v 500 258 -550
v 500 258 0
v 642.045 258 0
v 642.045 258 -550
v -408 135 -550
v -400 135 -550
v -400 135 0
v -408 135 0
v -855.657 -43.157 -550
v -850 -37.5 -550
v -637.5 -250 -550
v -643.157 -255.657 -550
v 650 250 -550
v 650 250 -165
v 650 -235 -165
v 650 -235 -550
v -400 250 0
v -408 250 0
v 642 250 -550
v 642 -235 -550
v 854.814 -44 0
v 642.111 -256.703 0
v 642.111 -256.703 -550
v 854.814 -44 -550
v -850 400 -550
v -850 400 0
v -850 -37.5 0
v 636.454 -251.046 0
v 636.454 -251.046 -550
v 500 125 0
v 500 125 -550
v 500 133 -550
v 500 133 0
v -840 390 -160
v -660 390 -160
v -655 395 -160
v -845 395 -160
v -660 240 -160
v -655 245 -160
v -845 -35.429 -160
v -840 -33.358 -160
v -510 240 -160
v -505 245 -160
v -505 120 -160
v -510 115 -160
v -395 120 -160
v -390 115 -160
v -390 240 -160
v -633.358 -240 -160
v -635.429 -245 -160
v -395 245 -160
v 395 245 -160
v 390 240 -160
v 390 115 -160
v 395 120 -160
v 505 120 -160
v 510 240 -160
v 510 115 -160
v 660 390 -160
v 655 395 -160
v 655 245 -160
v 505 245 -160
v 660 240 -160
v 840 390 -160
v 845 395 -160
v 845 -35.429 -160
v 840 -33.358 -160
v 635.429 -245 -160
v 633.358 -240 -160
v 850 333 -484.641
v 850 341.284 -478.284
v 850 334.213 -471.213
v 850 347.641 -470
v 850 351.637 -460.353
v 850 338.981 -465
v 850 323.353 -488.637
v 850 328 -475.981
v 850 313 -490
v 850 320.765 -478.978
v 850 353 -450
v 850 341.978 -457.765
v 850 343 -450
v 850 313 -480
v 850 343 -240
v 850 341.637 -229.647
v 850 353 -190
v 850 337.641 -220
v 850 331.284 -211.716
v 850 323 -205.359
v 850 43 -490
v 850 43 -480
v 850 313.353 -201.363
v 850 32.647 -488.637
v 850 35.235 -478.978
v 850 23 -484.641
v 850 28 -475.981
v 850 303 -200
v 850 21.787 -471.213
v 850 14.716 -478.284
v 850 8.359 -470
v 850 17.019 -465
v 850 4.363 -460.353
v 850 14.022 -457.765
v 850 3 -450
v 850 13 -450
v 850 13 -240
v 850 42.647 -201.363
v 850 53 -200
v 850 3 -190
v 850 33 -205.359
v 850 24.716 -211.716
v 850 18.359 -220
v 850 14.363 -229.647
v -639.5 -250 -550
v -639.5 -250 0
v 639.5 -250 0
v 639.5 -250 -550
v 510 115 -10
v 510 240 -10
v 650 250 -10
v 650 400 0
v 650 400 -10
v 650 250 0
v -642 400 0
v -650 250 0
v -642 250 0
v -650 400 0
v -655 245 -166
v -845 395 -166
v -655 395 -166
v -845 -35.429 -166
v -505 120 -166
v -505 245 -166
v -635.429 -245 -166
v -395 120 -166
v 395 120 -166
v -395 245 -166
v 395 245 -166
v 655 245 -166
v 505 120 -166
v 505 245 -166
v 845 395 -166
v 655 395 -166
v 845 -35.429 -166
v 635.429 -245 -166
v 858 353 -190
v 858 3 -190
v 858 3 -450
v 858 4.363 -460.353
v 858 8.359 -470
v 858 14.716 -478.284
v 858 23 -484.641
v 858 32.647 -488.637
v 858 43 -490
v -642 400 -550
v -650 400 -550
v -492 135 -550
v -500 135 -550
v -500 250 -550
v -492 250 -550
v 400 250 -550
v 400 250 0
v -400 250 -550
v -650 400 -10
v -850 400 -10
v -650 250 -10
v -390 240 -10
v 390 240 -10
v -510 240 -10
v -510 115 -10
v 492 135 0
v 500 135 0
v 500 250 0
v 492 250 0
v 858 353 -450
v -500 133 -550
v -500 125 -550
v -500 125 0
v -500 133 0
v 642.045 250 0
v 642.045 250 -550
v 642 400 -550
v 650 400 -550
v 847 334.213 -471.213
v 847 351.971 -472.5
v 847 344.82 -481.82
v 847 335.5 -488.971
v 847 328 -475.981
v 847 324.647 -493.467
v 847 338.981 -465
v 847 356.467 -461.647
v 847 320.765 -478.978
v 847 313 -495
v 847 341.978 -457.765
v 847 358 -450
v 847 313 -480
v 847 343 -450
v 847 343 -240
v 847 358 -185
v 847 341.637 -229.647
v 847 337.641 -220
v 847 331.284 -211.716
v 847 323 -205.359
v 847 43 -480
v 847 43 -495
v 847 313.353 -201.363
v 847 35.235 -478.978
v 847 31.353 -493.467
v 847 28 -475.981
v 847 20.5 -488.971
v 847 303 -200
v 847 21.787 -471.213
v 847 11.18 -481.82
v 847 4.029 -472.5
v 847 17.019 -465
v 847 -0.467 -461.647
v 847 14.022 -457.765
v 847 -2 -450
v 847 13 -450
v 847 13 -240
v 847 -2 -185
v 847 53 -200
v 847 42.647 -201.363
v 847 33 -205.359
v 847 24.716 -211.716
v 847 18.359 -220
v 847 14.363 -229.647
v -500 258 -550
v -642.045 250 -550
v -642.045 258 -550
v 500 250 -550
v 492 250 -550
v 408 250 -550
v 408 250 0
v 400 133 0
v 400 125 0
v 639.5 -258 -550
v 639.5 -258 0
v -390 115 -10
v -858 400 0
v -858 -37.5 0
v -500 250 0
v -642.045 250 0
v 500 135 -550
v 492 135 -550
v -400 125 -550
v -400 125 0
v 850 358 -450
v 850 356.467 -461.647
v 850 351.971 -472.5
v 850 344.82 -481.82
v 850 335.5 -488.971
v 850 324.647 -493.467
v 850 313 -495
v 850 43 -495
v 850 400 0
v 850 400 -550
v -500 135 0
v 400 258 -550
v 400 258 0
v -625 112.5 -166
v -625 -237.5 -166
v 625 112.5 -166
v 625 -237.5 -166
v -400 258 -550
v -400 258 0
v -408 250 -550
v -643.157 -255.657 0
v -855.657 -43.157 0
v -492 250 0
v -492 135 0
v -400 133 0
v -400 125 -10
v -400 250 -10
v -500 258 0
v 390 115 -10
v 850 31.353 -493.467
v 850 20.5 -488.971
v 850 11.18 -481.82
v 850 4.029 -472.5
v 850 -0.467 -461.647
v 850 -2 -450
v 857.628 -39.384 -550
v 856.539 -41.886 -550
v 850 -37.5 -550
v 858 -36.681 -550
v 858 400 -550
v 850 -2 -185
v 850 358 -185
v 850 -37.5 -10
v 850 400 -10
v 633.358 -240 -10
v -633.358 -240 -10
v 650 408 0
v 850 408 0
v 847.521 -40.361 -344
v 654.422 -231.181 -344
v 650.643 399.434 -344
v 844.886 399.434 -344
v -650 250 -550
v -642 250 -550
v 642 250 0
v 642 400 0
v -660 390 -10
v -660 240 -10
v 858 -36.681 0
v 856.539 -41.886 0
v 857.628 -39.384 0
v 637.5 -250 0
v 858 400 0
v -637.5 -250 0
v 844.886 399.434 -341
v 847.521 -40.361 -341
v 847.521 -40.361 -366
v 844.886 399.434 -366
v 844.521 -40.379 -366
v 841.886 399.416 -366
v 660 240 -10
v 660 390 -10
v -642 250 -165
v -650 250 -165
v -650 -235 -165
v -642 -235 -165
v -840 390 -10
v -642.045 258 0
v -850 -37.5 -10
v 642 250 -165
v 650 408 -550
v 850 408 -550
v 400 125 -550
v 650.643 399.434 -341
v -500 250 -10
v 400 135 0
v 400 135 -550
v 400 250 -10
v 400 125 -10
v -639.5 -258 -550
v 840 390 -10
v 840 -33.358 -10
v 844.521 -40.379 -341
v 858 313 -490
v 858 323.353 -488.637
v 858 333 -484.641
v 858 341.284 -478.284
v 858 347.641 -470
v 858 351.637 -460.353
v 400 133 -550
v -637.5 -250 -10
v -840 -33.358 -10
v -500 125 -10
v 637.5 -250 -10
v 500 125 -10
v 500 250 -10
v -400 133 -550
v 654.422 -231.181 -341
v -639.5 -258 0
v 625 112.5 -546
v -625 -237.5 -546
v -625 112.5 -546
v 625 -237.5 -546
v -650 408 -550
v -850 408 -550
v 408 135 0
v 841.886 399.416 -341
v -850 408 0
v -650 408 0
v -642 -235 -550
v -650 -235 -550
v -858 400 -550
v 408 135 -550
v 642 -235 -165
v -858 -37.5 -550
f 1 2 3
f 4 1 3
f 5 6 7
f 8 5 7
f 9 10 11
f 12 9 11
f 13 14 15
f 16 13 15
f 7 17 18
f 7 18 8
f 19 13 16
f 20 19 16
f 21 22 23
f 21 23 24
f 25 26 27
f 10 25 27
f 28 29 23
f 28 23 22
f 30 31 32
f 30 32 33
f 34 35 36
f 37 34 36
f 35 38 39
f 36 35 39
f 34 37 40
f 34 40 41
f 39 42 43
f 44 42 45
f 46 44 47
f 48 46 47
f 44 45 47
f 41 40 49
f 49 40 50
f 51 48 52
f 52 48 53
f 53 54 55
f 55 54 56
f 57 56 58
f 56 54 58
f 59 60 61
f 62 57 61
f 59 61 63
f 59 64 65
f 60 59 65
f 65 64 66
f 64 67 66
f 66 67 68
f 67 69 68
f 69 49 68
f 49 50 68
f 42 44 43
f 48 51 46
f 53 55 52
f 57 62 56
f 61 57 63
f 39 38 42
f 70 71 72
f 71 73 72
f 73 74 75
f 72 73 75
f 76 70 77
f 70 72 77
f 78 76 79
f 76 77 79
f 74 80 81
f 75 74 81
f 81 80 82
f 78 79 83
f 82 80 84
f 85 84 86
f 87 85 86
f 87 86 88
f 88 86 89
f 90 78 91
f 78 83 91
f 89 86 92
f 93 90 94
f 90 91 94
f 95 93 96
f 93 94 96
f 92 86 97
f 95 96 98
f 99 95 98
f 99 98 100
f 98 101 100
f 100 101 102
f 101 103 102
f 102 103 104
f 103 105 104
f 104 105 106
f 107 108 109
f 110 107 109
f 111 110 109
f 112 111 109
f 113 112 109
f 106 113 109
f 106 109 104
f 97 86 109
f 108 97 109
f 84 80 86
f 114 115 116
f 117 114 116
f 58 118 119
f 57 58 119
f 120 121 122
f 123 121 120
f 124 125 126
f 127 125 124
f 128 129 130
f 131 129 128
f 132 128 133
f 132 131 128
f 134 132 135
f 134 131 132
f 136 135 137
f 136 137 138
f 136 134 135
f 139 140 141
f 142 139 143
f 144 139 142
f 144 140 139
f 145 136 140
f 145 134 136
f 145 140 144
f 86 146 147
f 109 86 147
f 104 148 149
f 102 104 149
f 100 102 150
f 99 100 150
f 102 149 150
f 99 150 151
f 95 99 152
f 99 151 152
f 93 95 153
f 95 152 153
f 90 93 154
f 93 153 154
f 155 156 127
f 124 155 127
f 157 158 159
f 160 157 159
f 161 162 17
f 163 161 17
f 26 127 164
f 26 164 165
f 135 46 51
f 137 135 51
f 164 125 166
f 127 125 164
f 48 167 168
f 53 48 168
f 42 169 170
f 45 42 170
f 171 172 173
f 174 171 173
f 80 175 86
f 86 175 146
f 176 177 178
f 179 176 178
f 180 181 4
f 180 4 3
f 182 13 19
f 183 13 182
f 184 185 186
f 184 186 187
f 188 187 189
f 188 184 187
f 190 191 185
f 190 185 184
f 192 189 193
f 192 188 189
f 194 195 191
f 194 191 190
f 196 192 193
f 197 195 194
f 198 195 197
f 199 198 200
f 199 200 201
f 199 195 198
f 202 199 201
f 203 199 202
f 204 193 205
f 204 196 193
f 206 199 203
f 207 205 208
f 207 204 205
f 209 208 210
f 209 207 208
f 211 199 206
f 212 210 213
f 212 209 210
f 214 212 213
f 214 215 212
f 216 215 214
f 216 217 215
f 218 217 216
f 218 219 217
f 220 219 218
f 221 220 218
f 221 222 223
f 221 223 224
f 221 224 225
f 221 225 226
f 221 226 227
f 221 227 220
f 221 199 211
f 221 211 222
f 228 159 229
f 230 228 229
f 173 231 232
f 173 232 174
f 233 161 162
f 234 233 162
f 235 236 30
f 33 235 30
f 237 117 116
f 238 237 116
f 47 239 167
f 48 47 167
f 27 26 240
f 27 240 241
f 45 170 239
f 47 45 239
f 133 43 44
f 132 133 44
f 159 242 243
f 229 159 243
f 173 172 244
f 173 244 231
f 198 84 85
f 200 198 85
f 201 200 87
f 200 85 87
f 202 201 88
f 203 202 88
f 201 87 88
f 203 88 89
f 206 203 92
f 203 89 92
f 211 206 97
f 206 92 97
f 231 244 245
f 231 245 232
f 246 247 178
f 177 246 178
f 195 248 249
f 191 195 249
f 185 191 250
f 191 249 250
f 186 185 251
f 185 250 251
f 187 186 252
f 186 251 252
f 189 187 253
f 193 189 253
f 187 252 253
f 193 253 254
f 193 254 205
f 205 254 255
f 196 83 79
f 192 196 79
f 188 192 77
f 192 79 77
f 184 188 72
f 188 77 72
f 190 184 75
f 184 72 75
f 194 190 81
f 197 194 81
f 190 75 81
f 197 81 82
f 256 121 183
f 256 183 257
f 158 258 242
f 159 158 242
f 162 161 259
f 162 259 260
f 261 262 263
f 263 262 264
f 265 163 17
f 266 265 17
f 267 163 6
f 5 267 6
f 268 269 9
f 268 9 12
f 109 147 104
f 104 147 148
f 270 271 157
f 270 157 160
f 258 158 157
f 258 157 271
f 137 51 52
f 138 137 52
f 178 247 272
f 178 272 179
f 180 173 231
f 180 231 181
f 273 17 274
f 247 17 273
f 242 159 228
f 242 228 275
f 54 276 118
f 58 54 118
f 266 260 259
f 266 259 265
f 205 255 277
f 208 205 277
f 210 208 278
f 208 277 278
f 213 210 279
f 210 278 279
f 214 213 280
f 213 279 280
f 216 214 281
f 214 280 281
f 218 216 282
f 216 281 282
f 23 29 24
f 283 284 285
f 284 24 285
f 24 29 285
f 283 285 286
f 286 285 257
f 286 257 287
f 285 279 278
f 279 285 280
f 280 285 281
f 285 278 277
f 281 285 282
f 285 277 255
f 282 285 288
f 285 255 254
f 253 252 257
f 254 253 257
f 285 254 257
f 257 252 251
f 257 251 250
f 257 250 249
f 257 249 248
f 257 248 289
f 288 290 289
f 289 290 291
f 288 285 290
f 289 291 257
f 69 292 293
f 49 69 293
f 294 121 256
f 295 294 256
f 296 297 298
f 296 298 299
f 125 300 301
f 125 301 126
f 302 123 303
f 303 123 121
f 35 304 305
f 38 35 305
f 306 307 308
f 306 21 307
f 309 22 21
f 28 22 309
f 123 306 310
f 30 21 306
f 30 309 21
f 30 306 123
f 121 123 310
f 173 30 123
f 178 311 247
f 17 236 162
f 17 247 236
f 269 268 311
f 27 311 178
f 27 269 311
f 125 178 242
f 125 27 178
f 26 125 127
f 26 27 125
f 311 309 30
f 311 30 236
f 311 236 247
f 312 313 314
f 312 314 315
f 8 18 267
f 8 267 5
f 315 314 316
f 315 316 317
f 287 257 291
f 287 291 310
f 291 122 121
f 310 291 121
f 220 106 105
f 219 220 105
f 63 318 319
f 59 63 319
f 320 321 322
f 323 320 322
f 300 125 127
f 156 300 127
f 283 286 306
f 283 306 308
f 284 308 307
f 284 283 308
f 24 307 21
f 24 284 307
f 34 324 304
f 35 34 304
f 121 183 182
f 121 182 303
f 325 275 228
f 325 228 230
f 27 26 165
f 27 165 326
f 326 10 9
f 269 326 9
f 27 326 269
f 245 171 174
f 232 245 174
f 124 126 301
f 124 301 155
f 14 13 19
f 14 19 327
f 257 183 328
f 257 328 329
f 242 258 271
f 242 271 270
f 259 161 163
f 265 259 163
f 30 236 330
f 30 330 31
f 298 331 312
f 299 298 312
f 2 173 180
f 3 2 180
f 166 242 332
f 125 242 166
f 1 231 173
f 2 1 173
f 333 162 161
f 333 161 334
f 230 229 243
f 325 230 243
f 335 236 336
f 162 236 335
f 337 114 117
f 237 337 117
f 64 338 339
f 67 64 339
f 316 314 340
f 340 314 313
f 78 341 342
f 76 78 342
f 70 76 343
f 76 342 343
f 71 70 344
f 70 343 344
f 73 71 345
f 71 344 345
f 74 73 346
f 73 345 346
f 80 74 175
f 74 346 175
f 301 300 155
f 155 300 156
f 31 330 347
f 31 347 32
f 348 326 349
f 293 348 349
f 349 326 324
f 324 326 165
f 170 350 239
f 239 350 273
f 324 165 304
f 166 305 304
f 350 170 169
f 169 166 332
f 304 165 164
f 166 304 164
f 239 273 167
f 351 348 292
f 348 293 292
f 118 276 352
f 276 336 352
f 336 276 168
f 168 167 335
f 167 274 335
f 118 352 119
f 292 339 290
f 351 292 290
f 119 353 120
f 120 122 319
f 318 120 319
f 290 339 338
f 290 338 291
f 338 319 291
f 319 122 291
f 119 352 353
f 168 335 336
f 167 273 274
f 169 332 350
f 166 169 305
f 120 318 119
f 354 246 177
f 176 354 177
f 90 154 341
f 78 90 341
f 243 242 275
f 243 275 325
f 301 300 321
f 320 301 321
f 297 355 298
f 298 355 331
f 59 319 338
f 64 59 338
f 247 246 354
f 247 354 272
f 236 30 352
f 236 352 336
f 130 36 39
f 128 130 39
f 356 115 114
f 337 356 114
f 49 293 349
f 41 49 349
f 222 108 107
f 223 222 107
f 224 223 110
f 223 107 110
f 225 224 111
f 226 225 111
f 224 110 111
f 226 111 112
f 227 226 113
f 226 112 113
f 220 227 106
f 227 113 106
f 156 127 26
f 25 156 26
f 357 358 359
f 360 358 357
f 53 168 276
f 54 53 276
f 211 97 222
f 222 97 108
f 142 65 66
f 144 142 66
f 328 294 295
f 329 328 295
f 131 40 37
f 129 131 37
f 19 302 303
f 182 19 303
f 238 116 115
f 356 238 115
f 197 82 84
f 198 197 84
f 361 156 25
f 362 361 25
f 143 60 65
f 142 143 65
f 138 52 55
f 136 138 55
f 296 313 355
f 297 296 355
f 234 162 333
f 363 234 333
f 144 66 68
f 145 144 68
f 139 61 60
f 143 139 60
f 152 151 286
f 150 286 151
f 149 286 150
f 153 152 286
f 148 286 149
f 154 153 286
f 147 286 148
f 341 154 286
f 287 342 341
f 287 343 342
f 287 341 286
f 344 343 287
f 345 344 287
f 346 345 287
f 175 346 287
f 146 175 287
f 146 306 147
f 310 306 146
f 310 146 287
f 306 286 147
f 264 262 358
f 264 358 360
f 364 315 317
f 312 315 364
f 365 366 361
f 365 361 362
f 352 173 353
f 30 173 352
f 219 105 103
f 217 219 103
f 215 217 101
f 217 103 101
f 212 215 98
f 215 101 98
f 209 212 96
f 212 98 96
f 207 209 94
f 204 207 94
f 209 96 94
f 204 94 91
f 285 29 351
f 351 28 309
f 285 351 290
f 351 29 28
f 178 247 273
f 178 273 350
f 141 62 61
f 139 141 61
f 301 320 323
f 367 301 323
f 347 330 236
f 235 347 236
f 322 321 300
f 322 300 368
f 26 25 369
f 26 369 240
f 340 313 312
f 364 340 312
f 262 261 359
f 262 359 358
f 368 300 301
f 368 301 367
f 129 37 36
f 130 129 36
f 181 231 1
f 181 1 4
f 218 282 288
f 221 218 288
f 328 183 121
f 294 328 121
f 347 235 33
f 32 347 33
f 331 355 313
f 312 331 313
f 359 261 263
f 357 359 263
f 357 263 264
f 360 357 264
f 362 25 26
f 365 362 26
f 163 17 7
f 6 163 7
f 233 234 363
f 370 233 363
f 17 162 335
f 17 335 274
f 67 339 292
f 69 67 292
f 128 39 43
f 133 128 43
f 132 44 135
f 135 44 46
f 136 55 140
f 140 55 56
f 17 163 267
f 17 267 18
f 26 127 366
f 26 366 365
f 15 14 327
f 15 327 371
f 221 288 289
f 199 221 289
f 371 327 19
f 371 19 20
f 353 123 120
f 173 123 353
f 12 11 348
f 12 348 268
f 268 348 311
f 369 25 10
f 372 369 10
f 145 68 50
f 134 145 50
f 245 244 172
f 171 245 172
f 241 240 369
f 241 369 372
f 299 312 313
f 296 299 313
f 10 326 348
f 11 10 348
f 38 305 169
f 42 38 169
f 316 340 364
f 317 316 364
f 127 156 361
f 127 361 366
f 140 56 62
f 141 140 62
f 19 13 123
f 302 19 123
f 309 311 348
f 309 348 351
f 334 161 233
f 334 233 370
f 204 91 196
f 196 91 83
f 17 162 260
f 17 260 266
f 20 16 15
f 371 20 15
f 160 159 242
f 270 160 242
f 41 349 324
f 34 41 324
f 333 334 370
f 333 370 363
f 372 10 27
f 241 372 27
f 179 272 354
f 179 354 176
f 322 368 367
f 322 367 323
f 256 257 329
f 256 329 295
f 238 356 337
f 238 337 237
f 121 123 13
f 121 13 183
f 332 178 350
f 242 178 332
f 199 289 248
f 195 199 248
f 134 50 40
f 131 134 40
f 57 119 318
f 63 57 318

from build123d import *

# Parameters (mm, degrees)
F1_DEPTH     = 10
F3_DEPTH     = 150
F5_DEPTH     = 6
F6_W         = 437.5
F6_H         = 550
F7_DEPTH     = 8
F8_W         = 300.5203820043
F8_H         = 550
F9_DEPTH     = 8
F11_DEPTH    = 8
F12_W        = 302
F12_H        = 550
F13_DEPTH    = 8
F14_W        = 444
F14_H        = 550
F15_DEPTH    = 8
F16_W        = 200
F16_H        = 550
F17_DEPTH    = 8
F18_W        = 150
F18_H        = 550
F19_DEPTH    = 8
F20_W        = 142.0447230339
F20_H        = 550
F21_DEPTH    = 8
F22_W        = 100
F22_H        = 550
F23_DEPTH    = 8
F24_W        = 115
F24_H        = 550
F25_DEPTH    = 8
F26_W        = 115
F26_H        = 550
F27_DEPTH    = 8
F29_W        = 800
F29_H        = 550
F30_DEPTH    = 8
F31_W        = 485
F31_H        = 385
F32_DEPTH    = 8
F35_DEPTH    = 25
F37_DEPTH    = 3
F40_DEPTH    = 3
F41_W        = 439.8030777591
F41_H        = 25
F42_DEPTH    = 3
F43_W        = 1250
F43_H        = 350
F44_DEPTH    = 380
F45_T1_DEPTH = 586.5969180707


# Not quite as in the source:
# - a fillet or chamfer that OpenCascade refuses, or shapes differently, is made with other operations: its cross-section is extruded or revolved along the edge and cut away or added


with BuildPart() as f1:
    # F0 (on Top) → F1 (new body)
    with BuildSketch(Plane.XY):
        Polygon((650, 400), (650, 250), (500, 250), (500, 125), (400, 125), (400, 250), (-400, 250), (-400, 125), (-500, 125), (-500, 250), (-650, 250), (-650, 400), (-850, 400), (-850, 250), (-850, -37.5), (-637.5, -250), (637.5, -250), (850, -37.5), (850, 250), (850, 400), align=None)
    extrude(amount=-F1_DEPTH)

    # F2 (on face) → F3 (join)
    with BuildSketch(Plane(origin=(0, 0, -10), x_dir=(1, 0, 0), z_dir=(0, 0, -1))):
        Polygon((633.3578535131, 239.999973774), (-633.3578535131, 239.999973774), (-839.999973774, 33.3578535131), (-839.999973774, -389.999973774), (-660.000026226, -389.999973774), (-660.000026226, -239.999973774), (-510.000026226, -239.999973774), (-510.000026226, -114.999973774), (-389.999973774, -114.999973774), (-389.999973774, -239.999973774), (389.999973774, -239.999973774), (389.999973774, -114.999973774), (510.000026226, -114.999973774), (510.000026226, -239.999973774), (660.000026226, -239.999973774), (660.000026226, -389.999973774), (839.999973774, -389.999973774), (839.999973774, 33.3578535131), align=None)
    extrude(amount=F3_DEPTH)

    # F4 (on face) → F5 (join)
    with BuildSketch(Plane(origin=(0, 0, -160), x_dir=(1, 0, 0), z_dir=(0, 0, -1))):
        Polygon((844.999973774, -394.999973774), (844.999973774, 35.428921325), (635.428921325, 244.999973774), (-635.428921325, 244.999973774), (-844.999973774, 35.428921325), (-844.999973774, -394.999973774), (-655.000026226, -394.999973774), (-655.000026226, -244.999973774), (-505.000026226, -244.999973774), (-505.000026226, -119.999973774), (-394.999973774, -119.999973774), (-394.999973774, -244.999973774), (394.999973774, -244.999973774), (394.999973774, -119.999973774), (505.000026226, -119.999973774), (505.000026226, -244.999973774), (655.000026226, -244.999973774), (655.000026226, -394.999973774), align=None)
    extrude(amount=F5_DEPTH)

    # F8 (on face) → F9 (join)
    with BuildSketch(Plane(origin=(-443.75, -443.75, 0), x_dir=(0.7071067812, -0.7071067812, 0), z_dir=(-0.7071067812, -0.7071067812, 0))):
        with Locations((-424.2640687119, -275)):
            Rectangle(F8_W, F8_H)
    extrude(amount=F9_DEPTH)

    # F12 (on face) → F13 (join)
    with BuildSketch(Plane(origin=(443.75, -443.75, 0), x_dir=(0.7071067812, 0.7071067812, 0), z_dir=(0.7071067812, -0.7071067812, 0))):
        with Locations((423.5242597141, -275)):
            Rectangle(F12_W, F12_H)
    extrude(amount=F13_DEPTH)

    # F14 (on face) → F15 (join)
    with BuildSketch(Plane.YZ.offset(850)):
        with Locations((178, -275)):
            Rectangle(F14_W, F14_H)
    extrude(amount=F15_DEPTH)

    # F34 (on face) → F35 (cut)
    with BuildSketch(Plane.YZ.offset(858)):
        with BuildLine():
            ThreePointArc((3, -450), (14.7157287525, -478.2842712475), (43, -490))
            Line((43, -490), (313, -490))
            ThreePointArc((313, -490), (341.2842712475, -478.2842712475), (353, -450))
            Line((353, -450), (353, -190))
            Line((353, -190), (3, -190))
            Line((3, -190), (3, -450))
        make_face()
    extrude(amount=-F35_DEPTH, mode=Mode.SUBTRACT)

    # F36 (on face) → F37 (join)
    with BuildSketch(Plane(origin=(850, 0, 0), x_dir=(0, -1, 0), z_dir=(-1, 0, 0))):
        with BuildLine():
            ThreePointArc((-43, -495), (-11.1801948466, -481.8198051534), (2, -450))
            Line((2, -450), (2, -185))
            Line((2, -185), (-358, -185))
            Line((-358, -185), (-358, -450))
            ThreePointArc((-358, -450), (-344.8198051534, -481.8198051534), (-313, -495))
            Line((-313, -495), (-43, -495))
        make_face()
        with BuildLine():
            Line((-13, -240), (-13, -450))
            ThreePointArc((-13, -450), (-21.7867965644, -471.2132034356), (-43, -480))
            Line((-43, -480), (-313, -480))
            ThreePointArc((-313, -480), (-334.2132034356, -471.2132034356), (-343, -450))
            Line((-343, -450), (-343, -240))
            ThreePointArc((-343, -240), (-331.2842712475, -211.7157287525), (-303, -200))
            Line((-303, -200), (-53, -200))
            ThreePointArc((-53, -200), (-24.7157287525, -211.7157287525), (-13, -240))
        make_face(mode=Mode.SUBTRACT)
    extrude(amount=F37_DEPTH)

    # F45: fillet of radius 10 on 1 edges, made by hand

    # F45_s2 → F45_t1 (cut)
    with BuildSketch(Plane.XY.offset(-568.2984590353)):
        with BuildLine():
            ThreePointArc((858, -36.6806163859), (857.1688899271, -40.6720393784), (854.813708499, -44))
            Line((854.813708499, -44), (858, -44))
            Line((858, -44), (858, -36.6806163859))
        make_face()
    extrude(amount=F45_T1_DEPTH, mode=Mode.SUBTRACT)


with BuildPart() as f7:
    # F6 (on face) → F7 (new body)
    with BuildSketch(Plane(origin=(-850, 0, 0), x_dir=(0, -1, 0), z_dir=(-1, 0, 0))):
        with Locations((-181.25, -275)):
            Rectangle(F6_W, F6_H)
    extrude(amount=F7_DEPTH)


with BuildPart() as f11:
    # F10 (on face) → F11 (new body)
    with BuildSketch(Plane.XZ.offset(250)):
        Polygon((-637.5, 0), (-639.5, 0), (-639.5, -550), (639.5, -550), (639.5, 0), (637.5, 0), (635.5, 0), align=None)
    extrude(amount=F11_DEPTH)


with BuildPart() as f17:
    # F16 (on face) → F17 (new body)
    with BuildSketch(Plane(origin=(0, 400, 0), x_dir=(-1, 0, 0), z_dir=(0, 1, 0))):
        with Locations((750, -275)):
            Rectangle(F16_W, F16_H)
    extrude(amount=F17_DEPTH)


with BuildPart() as f19:
    # F18 (on face) → F19 (new body)
    with BuildSketch(Plane.YZ.offset(-650)):
        with Locations((325, -275)):
            Rectangle(F18_W, F18_H)
    extrude(amount=F19_DEPTH)


with BuildPart() as f21:
    # F20 (on face) → F21 (new body)
    with BuildSketch(Plane(origin=(0, 250, 0), x_dir=(-1, 0, 0), z_dir=(0, 1, 0))):
        with Locations((571.022361517, -275)):
            Rectangle(F20_W, F20_H)
    extrude(amount=F21_DEPTH)


with BuildPart() as f23:
    # F22 (on face) → F23 (new body)
    with BuildSketch(Plane(origin=(0, 125, 0), x_dir=(-1, 0, 0), z_dir=(0, 1, 0))):
        with Locations((450, -275)):
            Rectangle(F22_W, F22_H)
    extrude(amount=F23_DEPTH)


with BuildPart() as f25:
    # F24 (on face) → F25 (new body)
    with BuildSketch(Plane.YZ.offset(-500)):
        with Locations((192.5, -275)):
            Rectangle(F24_W, F24_H)
    extrude(amount=F25_DEPTH)


with BuildPart() as f27:
    # F26 (on face) → F27 (new body)
    with BuildSketch(Plane(origin=(-400, 0, 0), x_dir=(0, -1, 0), z_dir=(-1, 0, 0))):
        with Locations((-192.5, -275)):
            Rectangle(F26_W, F26_H)
    extrude(amount=F27_DEPTH)


with BuildPart() as f28_1:
    # F28: instance of F17
    add(f17.part.mirror(Plane.YZ))


with BuildPart() as f28_2:
    # F28: instance of F19
    add(f19.part.mirror(Plane.YZ))


with BuildPart() as f28_3:
    # F28: instance of F21
    add(f21.part.mirror(Plane.YZ))


with BuildPart() as f28_4:
    # F28: instance of F25
    add(f25.part.mirror(Plane.YZ))


with BuildPart() as f28_5:
    # F28: instance of F23
    add(f23.part.mirror(Plane.YZ))


with BuildPart() as f28_6:
    # F28: instance of F27
    add(f27.part.mirror(Plane.YZ))


with BuildPart() as f30:
    # F29 (on face) → F30 (new body)
    with BuildSketch(Plane(origin=(0, 250, 0), x_dir=(-1, 0, 0), z_dir=(0, 1, 0))):
        with Locations((0, -275)):
            Rectangle(F29_W, F29_H)
    extrude(amount=F30_DEPTH)


with BuildPart() as f32:
    # F31 (on face) → F32 (new body)
    with BuildSketch(Plane(origin=(-650, 0, 0), x_dir=(0, -1, 0), z_dir=(-1, 0, 0))):
        with Locations((-7.5, -357.5)):
            Rectangle(F31_W, F31_H)
    extrude(amount=-F32_DEPTH)


with BuildPart() as f33_1:
    # F33: instance of F32
    add(f32.part.mirror(Plane.YZ))


with BuildPart() as f40:
    # F39 (on offset) → F40 (new body)
    with BuildSketch(Plane(origin=(0, 0, -341), x_dir=(1, 0, 0), z_dir=(0, 0, -1))):
        Polygon((654.4221624106, 231.1809549509), (650.6431698799, -399.4338214397), (844.8856899004, -399.4338214397), (847.5211858749, 40.3613597155), align=None)
    extrude(amount=F40_DEPTH)


with BuildPart() as f42:
    # F41 (on face) → F42 (new body)
    with BuildSketch(Plane(origin=(847.2488929893, 5.0771839769, 0), x_dir=(-0.0059924455, 0.9999820451, 0), z_dir=(0.9999820451, 0.0059924455, 0))):
        with Locations((174.4621793297, -353.5)):
            Rectangle(F41_W, F41_H)
    extrude(amount=-F42_DEPTH)


with BuildPart() as f44:
    # F43 (on face) → F44 (new body)
    with BuildSketch(Plane(origin=(0, 0, -166), x_dir=(1, 0, 0), z_dir=(0, 0, -1))):
        with Locations((0, 62.499973774)):
            Rectangle(F43_W, F43_H)
    extrude(amount=F44_DEPTH)


solid = Compound([f1.part, f7.part, f11.part, f17.part, f19.part, f21.part, f23.part, f25.part, f27.part, f28_1.part, f28_2.part, f28_3.part, f28_4.part, f28_5.part, f28_6.part, f30.part, f32.part, f33_1.part, f40.part, f42.part, f44.part])
